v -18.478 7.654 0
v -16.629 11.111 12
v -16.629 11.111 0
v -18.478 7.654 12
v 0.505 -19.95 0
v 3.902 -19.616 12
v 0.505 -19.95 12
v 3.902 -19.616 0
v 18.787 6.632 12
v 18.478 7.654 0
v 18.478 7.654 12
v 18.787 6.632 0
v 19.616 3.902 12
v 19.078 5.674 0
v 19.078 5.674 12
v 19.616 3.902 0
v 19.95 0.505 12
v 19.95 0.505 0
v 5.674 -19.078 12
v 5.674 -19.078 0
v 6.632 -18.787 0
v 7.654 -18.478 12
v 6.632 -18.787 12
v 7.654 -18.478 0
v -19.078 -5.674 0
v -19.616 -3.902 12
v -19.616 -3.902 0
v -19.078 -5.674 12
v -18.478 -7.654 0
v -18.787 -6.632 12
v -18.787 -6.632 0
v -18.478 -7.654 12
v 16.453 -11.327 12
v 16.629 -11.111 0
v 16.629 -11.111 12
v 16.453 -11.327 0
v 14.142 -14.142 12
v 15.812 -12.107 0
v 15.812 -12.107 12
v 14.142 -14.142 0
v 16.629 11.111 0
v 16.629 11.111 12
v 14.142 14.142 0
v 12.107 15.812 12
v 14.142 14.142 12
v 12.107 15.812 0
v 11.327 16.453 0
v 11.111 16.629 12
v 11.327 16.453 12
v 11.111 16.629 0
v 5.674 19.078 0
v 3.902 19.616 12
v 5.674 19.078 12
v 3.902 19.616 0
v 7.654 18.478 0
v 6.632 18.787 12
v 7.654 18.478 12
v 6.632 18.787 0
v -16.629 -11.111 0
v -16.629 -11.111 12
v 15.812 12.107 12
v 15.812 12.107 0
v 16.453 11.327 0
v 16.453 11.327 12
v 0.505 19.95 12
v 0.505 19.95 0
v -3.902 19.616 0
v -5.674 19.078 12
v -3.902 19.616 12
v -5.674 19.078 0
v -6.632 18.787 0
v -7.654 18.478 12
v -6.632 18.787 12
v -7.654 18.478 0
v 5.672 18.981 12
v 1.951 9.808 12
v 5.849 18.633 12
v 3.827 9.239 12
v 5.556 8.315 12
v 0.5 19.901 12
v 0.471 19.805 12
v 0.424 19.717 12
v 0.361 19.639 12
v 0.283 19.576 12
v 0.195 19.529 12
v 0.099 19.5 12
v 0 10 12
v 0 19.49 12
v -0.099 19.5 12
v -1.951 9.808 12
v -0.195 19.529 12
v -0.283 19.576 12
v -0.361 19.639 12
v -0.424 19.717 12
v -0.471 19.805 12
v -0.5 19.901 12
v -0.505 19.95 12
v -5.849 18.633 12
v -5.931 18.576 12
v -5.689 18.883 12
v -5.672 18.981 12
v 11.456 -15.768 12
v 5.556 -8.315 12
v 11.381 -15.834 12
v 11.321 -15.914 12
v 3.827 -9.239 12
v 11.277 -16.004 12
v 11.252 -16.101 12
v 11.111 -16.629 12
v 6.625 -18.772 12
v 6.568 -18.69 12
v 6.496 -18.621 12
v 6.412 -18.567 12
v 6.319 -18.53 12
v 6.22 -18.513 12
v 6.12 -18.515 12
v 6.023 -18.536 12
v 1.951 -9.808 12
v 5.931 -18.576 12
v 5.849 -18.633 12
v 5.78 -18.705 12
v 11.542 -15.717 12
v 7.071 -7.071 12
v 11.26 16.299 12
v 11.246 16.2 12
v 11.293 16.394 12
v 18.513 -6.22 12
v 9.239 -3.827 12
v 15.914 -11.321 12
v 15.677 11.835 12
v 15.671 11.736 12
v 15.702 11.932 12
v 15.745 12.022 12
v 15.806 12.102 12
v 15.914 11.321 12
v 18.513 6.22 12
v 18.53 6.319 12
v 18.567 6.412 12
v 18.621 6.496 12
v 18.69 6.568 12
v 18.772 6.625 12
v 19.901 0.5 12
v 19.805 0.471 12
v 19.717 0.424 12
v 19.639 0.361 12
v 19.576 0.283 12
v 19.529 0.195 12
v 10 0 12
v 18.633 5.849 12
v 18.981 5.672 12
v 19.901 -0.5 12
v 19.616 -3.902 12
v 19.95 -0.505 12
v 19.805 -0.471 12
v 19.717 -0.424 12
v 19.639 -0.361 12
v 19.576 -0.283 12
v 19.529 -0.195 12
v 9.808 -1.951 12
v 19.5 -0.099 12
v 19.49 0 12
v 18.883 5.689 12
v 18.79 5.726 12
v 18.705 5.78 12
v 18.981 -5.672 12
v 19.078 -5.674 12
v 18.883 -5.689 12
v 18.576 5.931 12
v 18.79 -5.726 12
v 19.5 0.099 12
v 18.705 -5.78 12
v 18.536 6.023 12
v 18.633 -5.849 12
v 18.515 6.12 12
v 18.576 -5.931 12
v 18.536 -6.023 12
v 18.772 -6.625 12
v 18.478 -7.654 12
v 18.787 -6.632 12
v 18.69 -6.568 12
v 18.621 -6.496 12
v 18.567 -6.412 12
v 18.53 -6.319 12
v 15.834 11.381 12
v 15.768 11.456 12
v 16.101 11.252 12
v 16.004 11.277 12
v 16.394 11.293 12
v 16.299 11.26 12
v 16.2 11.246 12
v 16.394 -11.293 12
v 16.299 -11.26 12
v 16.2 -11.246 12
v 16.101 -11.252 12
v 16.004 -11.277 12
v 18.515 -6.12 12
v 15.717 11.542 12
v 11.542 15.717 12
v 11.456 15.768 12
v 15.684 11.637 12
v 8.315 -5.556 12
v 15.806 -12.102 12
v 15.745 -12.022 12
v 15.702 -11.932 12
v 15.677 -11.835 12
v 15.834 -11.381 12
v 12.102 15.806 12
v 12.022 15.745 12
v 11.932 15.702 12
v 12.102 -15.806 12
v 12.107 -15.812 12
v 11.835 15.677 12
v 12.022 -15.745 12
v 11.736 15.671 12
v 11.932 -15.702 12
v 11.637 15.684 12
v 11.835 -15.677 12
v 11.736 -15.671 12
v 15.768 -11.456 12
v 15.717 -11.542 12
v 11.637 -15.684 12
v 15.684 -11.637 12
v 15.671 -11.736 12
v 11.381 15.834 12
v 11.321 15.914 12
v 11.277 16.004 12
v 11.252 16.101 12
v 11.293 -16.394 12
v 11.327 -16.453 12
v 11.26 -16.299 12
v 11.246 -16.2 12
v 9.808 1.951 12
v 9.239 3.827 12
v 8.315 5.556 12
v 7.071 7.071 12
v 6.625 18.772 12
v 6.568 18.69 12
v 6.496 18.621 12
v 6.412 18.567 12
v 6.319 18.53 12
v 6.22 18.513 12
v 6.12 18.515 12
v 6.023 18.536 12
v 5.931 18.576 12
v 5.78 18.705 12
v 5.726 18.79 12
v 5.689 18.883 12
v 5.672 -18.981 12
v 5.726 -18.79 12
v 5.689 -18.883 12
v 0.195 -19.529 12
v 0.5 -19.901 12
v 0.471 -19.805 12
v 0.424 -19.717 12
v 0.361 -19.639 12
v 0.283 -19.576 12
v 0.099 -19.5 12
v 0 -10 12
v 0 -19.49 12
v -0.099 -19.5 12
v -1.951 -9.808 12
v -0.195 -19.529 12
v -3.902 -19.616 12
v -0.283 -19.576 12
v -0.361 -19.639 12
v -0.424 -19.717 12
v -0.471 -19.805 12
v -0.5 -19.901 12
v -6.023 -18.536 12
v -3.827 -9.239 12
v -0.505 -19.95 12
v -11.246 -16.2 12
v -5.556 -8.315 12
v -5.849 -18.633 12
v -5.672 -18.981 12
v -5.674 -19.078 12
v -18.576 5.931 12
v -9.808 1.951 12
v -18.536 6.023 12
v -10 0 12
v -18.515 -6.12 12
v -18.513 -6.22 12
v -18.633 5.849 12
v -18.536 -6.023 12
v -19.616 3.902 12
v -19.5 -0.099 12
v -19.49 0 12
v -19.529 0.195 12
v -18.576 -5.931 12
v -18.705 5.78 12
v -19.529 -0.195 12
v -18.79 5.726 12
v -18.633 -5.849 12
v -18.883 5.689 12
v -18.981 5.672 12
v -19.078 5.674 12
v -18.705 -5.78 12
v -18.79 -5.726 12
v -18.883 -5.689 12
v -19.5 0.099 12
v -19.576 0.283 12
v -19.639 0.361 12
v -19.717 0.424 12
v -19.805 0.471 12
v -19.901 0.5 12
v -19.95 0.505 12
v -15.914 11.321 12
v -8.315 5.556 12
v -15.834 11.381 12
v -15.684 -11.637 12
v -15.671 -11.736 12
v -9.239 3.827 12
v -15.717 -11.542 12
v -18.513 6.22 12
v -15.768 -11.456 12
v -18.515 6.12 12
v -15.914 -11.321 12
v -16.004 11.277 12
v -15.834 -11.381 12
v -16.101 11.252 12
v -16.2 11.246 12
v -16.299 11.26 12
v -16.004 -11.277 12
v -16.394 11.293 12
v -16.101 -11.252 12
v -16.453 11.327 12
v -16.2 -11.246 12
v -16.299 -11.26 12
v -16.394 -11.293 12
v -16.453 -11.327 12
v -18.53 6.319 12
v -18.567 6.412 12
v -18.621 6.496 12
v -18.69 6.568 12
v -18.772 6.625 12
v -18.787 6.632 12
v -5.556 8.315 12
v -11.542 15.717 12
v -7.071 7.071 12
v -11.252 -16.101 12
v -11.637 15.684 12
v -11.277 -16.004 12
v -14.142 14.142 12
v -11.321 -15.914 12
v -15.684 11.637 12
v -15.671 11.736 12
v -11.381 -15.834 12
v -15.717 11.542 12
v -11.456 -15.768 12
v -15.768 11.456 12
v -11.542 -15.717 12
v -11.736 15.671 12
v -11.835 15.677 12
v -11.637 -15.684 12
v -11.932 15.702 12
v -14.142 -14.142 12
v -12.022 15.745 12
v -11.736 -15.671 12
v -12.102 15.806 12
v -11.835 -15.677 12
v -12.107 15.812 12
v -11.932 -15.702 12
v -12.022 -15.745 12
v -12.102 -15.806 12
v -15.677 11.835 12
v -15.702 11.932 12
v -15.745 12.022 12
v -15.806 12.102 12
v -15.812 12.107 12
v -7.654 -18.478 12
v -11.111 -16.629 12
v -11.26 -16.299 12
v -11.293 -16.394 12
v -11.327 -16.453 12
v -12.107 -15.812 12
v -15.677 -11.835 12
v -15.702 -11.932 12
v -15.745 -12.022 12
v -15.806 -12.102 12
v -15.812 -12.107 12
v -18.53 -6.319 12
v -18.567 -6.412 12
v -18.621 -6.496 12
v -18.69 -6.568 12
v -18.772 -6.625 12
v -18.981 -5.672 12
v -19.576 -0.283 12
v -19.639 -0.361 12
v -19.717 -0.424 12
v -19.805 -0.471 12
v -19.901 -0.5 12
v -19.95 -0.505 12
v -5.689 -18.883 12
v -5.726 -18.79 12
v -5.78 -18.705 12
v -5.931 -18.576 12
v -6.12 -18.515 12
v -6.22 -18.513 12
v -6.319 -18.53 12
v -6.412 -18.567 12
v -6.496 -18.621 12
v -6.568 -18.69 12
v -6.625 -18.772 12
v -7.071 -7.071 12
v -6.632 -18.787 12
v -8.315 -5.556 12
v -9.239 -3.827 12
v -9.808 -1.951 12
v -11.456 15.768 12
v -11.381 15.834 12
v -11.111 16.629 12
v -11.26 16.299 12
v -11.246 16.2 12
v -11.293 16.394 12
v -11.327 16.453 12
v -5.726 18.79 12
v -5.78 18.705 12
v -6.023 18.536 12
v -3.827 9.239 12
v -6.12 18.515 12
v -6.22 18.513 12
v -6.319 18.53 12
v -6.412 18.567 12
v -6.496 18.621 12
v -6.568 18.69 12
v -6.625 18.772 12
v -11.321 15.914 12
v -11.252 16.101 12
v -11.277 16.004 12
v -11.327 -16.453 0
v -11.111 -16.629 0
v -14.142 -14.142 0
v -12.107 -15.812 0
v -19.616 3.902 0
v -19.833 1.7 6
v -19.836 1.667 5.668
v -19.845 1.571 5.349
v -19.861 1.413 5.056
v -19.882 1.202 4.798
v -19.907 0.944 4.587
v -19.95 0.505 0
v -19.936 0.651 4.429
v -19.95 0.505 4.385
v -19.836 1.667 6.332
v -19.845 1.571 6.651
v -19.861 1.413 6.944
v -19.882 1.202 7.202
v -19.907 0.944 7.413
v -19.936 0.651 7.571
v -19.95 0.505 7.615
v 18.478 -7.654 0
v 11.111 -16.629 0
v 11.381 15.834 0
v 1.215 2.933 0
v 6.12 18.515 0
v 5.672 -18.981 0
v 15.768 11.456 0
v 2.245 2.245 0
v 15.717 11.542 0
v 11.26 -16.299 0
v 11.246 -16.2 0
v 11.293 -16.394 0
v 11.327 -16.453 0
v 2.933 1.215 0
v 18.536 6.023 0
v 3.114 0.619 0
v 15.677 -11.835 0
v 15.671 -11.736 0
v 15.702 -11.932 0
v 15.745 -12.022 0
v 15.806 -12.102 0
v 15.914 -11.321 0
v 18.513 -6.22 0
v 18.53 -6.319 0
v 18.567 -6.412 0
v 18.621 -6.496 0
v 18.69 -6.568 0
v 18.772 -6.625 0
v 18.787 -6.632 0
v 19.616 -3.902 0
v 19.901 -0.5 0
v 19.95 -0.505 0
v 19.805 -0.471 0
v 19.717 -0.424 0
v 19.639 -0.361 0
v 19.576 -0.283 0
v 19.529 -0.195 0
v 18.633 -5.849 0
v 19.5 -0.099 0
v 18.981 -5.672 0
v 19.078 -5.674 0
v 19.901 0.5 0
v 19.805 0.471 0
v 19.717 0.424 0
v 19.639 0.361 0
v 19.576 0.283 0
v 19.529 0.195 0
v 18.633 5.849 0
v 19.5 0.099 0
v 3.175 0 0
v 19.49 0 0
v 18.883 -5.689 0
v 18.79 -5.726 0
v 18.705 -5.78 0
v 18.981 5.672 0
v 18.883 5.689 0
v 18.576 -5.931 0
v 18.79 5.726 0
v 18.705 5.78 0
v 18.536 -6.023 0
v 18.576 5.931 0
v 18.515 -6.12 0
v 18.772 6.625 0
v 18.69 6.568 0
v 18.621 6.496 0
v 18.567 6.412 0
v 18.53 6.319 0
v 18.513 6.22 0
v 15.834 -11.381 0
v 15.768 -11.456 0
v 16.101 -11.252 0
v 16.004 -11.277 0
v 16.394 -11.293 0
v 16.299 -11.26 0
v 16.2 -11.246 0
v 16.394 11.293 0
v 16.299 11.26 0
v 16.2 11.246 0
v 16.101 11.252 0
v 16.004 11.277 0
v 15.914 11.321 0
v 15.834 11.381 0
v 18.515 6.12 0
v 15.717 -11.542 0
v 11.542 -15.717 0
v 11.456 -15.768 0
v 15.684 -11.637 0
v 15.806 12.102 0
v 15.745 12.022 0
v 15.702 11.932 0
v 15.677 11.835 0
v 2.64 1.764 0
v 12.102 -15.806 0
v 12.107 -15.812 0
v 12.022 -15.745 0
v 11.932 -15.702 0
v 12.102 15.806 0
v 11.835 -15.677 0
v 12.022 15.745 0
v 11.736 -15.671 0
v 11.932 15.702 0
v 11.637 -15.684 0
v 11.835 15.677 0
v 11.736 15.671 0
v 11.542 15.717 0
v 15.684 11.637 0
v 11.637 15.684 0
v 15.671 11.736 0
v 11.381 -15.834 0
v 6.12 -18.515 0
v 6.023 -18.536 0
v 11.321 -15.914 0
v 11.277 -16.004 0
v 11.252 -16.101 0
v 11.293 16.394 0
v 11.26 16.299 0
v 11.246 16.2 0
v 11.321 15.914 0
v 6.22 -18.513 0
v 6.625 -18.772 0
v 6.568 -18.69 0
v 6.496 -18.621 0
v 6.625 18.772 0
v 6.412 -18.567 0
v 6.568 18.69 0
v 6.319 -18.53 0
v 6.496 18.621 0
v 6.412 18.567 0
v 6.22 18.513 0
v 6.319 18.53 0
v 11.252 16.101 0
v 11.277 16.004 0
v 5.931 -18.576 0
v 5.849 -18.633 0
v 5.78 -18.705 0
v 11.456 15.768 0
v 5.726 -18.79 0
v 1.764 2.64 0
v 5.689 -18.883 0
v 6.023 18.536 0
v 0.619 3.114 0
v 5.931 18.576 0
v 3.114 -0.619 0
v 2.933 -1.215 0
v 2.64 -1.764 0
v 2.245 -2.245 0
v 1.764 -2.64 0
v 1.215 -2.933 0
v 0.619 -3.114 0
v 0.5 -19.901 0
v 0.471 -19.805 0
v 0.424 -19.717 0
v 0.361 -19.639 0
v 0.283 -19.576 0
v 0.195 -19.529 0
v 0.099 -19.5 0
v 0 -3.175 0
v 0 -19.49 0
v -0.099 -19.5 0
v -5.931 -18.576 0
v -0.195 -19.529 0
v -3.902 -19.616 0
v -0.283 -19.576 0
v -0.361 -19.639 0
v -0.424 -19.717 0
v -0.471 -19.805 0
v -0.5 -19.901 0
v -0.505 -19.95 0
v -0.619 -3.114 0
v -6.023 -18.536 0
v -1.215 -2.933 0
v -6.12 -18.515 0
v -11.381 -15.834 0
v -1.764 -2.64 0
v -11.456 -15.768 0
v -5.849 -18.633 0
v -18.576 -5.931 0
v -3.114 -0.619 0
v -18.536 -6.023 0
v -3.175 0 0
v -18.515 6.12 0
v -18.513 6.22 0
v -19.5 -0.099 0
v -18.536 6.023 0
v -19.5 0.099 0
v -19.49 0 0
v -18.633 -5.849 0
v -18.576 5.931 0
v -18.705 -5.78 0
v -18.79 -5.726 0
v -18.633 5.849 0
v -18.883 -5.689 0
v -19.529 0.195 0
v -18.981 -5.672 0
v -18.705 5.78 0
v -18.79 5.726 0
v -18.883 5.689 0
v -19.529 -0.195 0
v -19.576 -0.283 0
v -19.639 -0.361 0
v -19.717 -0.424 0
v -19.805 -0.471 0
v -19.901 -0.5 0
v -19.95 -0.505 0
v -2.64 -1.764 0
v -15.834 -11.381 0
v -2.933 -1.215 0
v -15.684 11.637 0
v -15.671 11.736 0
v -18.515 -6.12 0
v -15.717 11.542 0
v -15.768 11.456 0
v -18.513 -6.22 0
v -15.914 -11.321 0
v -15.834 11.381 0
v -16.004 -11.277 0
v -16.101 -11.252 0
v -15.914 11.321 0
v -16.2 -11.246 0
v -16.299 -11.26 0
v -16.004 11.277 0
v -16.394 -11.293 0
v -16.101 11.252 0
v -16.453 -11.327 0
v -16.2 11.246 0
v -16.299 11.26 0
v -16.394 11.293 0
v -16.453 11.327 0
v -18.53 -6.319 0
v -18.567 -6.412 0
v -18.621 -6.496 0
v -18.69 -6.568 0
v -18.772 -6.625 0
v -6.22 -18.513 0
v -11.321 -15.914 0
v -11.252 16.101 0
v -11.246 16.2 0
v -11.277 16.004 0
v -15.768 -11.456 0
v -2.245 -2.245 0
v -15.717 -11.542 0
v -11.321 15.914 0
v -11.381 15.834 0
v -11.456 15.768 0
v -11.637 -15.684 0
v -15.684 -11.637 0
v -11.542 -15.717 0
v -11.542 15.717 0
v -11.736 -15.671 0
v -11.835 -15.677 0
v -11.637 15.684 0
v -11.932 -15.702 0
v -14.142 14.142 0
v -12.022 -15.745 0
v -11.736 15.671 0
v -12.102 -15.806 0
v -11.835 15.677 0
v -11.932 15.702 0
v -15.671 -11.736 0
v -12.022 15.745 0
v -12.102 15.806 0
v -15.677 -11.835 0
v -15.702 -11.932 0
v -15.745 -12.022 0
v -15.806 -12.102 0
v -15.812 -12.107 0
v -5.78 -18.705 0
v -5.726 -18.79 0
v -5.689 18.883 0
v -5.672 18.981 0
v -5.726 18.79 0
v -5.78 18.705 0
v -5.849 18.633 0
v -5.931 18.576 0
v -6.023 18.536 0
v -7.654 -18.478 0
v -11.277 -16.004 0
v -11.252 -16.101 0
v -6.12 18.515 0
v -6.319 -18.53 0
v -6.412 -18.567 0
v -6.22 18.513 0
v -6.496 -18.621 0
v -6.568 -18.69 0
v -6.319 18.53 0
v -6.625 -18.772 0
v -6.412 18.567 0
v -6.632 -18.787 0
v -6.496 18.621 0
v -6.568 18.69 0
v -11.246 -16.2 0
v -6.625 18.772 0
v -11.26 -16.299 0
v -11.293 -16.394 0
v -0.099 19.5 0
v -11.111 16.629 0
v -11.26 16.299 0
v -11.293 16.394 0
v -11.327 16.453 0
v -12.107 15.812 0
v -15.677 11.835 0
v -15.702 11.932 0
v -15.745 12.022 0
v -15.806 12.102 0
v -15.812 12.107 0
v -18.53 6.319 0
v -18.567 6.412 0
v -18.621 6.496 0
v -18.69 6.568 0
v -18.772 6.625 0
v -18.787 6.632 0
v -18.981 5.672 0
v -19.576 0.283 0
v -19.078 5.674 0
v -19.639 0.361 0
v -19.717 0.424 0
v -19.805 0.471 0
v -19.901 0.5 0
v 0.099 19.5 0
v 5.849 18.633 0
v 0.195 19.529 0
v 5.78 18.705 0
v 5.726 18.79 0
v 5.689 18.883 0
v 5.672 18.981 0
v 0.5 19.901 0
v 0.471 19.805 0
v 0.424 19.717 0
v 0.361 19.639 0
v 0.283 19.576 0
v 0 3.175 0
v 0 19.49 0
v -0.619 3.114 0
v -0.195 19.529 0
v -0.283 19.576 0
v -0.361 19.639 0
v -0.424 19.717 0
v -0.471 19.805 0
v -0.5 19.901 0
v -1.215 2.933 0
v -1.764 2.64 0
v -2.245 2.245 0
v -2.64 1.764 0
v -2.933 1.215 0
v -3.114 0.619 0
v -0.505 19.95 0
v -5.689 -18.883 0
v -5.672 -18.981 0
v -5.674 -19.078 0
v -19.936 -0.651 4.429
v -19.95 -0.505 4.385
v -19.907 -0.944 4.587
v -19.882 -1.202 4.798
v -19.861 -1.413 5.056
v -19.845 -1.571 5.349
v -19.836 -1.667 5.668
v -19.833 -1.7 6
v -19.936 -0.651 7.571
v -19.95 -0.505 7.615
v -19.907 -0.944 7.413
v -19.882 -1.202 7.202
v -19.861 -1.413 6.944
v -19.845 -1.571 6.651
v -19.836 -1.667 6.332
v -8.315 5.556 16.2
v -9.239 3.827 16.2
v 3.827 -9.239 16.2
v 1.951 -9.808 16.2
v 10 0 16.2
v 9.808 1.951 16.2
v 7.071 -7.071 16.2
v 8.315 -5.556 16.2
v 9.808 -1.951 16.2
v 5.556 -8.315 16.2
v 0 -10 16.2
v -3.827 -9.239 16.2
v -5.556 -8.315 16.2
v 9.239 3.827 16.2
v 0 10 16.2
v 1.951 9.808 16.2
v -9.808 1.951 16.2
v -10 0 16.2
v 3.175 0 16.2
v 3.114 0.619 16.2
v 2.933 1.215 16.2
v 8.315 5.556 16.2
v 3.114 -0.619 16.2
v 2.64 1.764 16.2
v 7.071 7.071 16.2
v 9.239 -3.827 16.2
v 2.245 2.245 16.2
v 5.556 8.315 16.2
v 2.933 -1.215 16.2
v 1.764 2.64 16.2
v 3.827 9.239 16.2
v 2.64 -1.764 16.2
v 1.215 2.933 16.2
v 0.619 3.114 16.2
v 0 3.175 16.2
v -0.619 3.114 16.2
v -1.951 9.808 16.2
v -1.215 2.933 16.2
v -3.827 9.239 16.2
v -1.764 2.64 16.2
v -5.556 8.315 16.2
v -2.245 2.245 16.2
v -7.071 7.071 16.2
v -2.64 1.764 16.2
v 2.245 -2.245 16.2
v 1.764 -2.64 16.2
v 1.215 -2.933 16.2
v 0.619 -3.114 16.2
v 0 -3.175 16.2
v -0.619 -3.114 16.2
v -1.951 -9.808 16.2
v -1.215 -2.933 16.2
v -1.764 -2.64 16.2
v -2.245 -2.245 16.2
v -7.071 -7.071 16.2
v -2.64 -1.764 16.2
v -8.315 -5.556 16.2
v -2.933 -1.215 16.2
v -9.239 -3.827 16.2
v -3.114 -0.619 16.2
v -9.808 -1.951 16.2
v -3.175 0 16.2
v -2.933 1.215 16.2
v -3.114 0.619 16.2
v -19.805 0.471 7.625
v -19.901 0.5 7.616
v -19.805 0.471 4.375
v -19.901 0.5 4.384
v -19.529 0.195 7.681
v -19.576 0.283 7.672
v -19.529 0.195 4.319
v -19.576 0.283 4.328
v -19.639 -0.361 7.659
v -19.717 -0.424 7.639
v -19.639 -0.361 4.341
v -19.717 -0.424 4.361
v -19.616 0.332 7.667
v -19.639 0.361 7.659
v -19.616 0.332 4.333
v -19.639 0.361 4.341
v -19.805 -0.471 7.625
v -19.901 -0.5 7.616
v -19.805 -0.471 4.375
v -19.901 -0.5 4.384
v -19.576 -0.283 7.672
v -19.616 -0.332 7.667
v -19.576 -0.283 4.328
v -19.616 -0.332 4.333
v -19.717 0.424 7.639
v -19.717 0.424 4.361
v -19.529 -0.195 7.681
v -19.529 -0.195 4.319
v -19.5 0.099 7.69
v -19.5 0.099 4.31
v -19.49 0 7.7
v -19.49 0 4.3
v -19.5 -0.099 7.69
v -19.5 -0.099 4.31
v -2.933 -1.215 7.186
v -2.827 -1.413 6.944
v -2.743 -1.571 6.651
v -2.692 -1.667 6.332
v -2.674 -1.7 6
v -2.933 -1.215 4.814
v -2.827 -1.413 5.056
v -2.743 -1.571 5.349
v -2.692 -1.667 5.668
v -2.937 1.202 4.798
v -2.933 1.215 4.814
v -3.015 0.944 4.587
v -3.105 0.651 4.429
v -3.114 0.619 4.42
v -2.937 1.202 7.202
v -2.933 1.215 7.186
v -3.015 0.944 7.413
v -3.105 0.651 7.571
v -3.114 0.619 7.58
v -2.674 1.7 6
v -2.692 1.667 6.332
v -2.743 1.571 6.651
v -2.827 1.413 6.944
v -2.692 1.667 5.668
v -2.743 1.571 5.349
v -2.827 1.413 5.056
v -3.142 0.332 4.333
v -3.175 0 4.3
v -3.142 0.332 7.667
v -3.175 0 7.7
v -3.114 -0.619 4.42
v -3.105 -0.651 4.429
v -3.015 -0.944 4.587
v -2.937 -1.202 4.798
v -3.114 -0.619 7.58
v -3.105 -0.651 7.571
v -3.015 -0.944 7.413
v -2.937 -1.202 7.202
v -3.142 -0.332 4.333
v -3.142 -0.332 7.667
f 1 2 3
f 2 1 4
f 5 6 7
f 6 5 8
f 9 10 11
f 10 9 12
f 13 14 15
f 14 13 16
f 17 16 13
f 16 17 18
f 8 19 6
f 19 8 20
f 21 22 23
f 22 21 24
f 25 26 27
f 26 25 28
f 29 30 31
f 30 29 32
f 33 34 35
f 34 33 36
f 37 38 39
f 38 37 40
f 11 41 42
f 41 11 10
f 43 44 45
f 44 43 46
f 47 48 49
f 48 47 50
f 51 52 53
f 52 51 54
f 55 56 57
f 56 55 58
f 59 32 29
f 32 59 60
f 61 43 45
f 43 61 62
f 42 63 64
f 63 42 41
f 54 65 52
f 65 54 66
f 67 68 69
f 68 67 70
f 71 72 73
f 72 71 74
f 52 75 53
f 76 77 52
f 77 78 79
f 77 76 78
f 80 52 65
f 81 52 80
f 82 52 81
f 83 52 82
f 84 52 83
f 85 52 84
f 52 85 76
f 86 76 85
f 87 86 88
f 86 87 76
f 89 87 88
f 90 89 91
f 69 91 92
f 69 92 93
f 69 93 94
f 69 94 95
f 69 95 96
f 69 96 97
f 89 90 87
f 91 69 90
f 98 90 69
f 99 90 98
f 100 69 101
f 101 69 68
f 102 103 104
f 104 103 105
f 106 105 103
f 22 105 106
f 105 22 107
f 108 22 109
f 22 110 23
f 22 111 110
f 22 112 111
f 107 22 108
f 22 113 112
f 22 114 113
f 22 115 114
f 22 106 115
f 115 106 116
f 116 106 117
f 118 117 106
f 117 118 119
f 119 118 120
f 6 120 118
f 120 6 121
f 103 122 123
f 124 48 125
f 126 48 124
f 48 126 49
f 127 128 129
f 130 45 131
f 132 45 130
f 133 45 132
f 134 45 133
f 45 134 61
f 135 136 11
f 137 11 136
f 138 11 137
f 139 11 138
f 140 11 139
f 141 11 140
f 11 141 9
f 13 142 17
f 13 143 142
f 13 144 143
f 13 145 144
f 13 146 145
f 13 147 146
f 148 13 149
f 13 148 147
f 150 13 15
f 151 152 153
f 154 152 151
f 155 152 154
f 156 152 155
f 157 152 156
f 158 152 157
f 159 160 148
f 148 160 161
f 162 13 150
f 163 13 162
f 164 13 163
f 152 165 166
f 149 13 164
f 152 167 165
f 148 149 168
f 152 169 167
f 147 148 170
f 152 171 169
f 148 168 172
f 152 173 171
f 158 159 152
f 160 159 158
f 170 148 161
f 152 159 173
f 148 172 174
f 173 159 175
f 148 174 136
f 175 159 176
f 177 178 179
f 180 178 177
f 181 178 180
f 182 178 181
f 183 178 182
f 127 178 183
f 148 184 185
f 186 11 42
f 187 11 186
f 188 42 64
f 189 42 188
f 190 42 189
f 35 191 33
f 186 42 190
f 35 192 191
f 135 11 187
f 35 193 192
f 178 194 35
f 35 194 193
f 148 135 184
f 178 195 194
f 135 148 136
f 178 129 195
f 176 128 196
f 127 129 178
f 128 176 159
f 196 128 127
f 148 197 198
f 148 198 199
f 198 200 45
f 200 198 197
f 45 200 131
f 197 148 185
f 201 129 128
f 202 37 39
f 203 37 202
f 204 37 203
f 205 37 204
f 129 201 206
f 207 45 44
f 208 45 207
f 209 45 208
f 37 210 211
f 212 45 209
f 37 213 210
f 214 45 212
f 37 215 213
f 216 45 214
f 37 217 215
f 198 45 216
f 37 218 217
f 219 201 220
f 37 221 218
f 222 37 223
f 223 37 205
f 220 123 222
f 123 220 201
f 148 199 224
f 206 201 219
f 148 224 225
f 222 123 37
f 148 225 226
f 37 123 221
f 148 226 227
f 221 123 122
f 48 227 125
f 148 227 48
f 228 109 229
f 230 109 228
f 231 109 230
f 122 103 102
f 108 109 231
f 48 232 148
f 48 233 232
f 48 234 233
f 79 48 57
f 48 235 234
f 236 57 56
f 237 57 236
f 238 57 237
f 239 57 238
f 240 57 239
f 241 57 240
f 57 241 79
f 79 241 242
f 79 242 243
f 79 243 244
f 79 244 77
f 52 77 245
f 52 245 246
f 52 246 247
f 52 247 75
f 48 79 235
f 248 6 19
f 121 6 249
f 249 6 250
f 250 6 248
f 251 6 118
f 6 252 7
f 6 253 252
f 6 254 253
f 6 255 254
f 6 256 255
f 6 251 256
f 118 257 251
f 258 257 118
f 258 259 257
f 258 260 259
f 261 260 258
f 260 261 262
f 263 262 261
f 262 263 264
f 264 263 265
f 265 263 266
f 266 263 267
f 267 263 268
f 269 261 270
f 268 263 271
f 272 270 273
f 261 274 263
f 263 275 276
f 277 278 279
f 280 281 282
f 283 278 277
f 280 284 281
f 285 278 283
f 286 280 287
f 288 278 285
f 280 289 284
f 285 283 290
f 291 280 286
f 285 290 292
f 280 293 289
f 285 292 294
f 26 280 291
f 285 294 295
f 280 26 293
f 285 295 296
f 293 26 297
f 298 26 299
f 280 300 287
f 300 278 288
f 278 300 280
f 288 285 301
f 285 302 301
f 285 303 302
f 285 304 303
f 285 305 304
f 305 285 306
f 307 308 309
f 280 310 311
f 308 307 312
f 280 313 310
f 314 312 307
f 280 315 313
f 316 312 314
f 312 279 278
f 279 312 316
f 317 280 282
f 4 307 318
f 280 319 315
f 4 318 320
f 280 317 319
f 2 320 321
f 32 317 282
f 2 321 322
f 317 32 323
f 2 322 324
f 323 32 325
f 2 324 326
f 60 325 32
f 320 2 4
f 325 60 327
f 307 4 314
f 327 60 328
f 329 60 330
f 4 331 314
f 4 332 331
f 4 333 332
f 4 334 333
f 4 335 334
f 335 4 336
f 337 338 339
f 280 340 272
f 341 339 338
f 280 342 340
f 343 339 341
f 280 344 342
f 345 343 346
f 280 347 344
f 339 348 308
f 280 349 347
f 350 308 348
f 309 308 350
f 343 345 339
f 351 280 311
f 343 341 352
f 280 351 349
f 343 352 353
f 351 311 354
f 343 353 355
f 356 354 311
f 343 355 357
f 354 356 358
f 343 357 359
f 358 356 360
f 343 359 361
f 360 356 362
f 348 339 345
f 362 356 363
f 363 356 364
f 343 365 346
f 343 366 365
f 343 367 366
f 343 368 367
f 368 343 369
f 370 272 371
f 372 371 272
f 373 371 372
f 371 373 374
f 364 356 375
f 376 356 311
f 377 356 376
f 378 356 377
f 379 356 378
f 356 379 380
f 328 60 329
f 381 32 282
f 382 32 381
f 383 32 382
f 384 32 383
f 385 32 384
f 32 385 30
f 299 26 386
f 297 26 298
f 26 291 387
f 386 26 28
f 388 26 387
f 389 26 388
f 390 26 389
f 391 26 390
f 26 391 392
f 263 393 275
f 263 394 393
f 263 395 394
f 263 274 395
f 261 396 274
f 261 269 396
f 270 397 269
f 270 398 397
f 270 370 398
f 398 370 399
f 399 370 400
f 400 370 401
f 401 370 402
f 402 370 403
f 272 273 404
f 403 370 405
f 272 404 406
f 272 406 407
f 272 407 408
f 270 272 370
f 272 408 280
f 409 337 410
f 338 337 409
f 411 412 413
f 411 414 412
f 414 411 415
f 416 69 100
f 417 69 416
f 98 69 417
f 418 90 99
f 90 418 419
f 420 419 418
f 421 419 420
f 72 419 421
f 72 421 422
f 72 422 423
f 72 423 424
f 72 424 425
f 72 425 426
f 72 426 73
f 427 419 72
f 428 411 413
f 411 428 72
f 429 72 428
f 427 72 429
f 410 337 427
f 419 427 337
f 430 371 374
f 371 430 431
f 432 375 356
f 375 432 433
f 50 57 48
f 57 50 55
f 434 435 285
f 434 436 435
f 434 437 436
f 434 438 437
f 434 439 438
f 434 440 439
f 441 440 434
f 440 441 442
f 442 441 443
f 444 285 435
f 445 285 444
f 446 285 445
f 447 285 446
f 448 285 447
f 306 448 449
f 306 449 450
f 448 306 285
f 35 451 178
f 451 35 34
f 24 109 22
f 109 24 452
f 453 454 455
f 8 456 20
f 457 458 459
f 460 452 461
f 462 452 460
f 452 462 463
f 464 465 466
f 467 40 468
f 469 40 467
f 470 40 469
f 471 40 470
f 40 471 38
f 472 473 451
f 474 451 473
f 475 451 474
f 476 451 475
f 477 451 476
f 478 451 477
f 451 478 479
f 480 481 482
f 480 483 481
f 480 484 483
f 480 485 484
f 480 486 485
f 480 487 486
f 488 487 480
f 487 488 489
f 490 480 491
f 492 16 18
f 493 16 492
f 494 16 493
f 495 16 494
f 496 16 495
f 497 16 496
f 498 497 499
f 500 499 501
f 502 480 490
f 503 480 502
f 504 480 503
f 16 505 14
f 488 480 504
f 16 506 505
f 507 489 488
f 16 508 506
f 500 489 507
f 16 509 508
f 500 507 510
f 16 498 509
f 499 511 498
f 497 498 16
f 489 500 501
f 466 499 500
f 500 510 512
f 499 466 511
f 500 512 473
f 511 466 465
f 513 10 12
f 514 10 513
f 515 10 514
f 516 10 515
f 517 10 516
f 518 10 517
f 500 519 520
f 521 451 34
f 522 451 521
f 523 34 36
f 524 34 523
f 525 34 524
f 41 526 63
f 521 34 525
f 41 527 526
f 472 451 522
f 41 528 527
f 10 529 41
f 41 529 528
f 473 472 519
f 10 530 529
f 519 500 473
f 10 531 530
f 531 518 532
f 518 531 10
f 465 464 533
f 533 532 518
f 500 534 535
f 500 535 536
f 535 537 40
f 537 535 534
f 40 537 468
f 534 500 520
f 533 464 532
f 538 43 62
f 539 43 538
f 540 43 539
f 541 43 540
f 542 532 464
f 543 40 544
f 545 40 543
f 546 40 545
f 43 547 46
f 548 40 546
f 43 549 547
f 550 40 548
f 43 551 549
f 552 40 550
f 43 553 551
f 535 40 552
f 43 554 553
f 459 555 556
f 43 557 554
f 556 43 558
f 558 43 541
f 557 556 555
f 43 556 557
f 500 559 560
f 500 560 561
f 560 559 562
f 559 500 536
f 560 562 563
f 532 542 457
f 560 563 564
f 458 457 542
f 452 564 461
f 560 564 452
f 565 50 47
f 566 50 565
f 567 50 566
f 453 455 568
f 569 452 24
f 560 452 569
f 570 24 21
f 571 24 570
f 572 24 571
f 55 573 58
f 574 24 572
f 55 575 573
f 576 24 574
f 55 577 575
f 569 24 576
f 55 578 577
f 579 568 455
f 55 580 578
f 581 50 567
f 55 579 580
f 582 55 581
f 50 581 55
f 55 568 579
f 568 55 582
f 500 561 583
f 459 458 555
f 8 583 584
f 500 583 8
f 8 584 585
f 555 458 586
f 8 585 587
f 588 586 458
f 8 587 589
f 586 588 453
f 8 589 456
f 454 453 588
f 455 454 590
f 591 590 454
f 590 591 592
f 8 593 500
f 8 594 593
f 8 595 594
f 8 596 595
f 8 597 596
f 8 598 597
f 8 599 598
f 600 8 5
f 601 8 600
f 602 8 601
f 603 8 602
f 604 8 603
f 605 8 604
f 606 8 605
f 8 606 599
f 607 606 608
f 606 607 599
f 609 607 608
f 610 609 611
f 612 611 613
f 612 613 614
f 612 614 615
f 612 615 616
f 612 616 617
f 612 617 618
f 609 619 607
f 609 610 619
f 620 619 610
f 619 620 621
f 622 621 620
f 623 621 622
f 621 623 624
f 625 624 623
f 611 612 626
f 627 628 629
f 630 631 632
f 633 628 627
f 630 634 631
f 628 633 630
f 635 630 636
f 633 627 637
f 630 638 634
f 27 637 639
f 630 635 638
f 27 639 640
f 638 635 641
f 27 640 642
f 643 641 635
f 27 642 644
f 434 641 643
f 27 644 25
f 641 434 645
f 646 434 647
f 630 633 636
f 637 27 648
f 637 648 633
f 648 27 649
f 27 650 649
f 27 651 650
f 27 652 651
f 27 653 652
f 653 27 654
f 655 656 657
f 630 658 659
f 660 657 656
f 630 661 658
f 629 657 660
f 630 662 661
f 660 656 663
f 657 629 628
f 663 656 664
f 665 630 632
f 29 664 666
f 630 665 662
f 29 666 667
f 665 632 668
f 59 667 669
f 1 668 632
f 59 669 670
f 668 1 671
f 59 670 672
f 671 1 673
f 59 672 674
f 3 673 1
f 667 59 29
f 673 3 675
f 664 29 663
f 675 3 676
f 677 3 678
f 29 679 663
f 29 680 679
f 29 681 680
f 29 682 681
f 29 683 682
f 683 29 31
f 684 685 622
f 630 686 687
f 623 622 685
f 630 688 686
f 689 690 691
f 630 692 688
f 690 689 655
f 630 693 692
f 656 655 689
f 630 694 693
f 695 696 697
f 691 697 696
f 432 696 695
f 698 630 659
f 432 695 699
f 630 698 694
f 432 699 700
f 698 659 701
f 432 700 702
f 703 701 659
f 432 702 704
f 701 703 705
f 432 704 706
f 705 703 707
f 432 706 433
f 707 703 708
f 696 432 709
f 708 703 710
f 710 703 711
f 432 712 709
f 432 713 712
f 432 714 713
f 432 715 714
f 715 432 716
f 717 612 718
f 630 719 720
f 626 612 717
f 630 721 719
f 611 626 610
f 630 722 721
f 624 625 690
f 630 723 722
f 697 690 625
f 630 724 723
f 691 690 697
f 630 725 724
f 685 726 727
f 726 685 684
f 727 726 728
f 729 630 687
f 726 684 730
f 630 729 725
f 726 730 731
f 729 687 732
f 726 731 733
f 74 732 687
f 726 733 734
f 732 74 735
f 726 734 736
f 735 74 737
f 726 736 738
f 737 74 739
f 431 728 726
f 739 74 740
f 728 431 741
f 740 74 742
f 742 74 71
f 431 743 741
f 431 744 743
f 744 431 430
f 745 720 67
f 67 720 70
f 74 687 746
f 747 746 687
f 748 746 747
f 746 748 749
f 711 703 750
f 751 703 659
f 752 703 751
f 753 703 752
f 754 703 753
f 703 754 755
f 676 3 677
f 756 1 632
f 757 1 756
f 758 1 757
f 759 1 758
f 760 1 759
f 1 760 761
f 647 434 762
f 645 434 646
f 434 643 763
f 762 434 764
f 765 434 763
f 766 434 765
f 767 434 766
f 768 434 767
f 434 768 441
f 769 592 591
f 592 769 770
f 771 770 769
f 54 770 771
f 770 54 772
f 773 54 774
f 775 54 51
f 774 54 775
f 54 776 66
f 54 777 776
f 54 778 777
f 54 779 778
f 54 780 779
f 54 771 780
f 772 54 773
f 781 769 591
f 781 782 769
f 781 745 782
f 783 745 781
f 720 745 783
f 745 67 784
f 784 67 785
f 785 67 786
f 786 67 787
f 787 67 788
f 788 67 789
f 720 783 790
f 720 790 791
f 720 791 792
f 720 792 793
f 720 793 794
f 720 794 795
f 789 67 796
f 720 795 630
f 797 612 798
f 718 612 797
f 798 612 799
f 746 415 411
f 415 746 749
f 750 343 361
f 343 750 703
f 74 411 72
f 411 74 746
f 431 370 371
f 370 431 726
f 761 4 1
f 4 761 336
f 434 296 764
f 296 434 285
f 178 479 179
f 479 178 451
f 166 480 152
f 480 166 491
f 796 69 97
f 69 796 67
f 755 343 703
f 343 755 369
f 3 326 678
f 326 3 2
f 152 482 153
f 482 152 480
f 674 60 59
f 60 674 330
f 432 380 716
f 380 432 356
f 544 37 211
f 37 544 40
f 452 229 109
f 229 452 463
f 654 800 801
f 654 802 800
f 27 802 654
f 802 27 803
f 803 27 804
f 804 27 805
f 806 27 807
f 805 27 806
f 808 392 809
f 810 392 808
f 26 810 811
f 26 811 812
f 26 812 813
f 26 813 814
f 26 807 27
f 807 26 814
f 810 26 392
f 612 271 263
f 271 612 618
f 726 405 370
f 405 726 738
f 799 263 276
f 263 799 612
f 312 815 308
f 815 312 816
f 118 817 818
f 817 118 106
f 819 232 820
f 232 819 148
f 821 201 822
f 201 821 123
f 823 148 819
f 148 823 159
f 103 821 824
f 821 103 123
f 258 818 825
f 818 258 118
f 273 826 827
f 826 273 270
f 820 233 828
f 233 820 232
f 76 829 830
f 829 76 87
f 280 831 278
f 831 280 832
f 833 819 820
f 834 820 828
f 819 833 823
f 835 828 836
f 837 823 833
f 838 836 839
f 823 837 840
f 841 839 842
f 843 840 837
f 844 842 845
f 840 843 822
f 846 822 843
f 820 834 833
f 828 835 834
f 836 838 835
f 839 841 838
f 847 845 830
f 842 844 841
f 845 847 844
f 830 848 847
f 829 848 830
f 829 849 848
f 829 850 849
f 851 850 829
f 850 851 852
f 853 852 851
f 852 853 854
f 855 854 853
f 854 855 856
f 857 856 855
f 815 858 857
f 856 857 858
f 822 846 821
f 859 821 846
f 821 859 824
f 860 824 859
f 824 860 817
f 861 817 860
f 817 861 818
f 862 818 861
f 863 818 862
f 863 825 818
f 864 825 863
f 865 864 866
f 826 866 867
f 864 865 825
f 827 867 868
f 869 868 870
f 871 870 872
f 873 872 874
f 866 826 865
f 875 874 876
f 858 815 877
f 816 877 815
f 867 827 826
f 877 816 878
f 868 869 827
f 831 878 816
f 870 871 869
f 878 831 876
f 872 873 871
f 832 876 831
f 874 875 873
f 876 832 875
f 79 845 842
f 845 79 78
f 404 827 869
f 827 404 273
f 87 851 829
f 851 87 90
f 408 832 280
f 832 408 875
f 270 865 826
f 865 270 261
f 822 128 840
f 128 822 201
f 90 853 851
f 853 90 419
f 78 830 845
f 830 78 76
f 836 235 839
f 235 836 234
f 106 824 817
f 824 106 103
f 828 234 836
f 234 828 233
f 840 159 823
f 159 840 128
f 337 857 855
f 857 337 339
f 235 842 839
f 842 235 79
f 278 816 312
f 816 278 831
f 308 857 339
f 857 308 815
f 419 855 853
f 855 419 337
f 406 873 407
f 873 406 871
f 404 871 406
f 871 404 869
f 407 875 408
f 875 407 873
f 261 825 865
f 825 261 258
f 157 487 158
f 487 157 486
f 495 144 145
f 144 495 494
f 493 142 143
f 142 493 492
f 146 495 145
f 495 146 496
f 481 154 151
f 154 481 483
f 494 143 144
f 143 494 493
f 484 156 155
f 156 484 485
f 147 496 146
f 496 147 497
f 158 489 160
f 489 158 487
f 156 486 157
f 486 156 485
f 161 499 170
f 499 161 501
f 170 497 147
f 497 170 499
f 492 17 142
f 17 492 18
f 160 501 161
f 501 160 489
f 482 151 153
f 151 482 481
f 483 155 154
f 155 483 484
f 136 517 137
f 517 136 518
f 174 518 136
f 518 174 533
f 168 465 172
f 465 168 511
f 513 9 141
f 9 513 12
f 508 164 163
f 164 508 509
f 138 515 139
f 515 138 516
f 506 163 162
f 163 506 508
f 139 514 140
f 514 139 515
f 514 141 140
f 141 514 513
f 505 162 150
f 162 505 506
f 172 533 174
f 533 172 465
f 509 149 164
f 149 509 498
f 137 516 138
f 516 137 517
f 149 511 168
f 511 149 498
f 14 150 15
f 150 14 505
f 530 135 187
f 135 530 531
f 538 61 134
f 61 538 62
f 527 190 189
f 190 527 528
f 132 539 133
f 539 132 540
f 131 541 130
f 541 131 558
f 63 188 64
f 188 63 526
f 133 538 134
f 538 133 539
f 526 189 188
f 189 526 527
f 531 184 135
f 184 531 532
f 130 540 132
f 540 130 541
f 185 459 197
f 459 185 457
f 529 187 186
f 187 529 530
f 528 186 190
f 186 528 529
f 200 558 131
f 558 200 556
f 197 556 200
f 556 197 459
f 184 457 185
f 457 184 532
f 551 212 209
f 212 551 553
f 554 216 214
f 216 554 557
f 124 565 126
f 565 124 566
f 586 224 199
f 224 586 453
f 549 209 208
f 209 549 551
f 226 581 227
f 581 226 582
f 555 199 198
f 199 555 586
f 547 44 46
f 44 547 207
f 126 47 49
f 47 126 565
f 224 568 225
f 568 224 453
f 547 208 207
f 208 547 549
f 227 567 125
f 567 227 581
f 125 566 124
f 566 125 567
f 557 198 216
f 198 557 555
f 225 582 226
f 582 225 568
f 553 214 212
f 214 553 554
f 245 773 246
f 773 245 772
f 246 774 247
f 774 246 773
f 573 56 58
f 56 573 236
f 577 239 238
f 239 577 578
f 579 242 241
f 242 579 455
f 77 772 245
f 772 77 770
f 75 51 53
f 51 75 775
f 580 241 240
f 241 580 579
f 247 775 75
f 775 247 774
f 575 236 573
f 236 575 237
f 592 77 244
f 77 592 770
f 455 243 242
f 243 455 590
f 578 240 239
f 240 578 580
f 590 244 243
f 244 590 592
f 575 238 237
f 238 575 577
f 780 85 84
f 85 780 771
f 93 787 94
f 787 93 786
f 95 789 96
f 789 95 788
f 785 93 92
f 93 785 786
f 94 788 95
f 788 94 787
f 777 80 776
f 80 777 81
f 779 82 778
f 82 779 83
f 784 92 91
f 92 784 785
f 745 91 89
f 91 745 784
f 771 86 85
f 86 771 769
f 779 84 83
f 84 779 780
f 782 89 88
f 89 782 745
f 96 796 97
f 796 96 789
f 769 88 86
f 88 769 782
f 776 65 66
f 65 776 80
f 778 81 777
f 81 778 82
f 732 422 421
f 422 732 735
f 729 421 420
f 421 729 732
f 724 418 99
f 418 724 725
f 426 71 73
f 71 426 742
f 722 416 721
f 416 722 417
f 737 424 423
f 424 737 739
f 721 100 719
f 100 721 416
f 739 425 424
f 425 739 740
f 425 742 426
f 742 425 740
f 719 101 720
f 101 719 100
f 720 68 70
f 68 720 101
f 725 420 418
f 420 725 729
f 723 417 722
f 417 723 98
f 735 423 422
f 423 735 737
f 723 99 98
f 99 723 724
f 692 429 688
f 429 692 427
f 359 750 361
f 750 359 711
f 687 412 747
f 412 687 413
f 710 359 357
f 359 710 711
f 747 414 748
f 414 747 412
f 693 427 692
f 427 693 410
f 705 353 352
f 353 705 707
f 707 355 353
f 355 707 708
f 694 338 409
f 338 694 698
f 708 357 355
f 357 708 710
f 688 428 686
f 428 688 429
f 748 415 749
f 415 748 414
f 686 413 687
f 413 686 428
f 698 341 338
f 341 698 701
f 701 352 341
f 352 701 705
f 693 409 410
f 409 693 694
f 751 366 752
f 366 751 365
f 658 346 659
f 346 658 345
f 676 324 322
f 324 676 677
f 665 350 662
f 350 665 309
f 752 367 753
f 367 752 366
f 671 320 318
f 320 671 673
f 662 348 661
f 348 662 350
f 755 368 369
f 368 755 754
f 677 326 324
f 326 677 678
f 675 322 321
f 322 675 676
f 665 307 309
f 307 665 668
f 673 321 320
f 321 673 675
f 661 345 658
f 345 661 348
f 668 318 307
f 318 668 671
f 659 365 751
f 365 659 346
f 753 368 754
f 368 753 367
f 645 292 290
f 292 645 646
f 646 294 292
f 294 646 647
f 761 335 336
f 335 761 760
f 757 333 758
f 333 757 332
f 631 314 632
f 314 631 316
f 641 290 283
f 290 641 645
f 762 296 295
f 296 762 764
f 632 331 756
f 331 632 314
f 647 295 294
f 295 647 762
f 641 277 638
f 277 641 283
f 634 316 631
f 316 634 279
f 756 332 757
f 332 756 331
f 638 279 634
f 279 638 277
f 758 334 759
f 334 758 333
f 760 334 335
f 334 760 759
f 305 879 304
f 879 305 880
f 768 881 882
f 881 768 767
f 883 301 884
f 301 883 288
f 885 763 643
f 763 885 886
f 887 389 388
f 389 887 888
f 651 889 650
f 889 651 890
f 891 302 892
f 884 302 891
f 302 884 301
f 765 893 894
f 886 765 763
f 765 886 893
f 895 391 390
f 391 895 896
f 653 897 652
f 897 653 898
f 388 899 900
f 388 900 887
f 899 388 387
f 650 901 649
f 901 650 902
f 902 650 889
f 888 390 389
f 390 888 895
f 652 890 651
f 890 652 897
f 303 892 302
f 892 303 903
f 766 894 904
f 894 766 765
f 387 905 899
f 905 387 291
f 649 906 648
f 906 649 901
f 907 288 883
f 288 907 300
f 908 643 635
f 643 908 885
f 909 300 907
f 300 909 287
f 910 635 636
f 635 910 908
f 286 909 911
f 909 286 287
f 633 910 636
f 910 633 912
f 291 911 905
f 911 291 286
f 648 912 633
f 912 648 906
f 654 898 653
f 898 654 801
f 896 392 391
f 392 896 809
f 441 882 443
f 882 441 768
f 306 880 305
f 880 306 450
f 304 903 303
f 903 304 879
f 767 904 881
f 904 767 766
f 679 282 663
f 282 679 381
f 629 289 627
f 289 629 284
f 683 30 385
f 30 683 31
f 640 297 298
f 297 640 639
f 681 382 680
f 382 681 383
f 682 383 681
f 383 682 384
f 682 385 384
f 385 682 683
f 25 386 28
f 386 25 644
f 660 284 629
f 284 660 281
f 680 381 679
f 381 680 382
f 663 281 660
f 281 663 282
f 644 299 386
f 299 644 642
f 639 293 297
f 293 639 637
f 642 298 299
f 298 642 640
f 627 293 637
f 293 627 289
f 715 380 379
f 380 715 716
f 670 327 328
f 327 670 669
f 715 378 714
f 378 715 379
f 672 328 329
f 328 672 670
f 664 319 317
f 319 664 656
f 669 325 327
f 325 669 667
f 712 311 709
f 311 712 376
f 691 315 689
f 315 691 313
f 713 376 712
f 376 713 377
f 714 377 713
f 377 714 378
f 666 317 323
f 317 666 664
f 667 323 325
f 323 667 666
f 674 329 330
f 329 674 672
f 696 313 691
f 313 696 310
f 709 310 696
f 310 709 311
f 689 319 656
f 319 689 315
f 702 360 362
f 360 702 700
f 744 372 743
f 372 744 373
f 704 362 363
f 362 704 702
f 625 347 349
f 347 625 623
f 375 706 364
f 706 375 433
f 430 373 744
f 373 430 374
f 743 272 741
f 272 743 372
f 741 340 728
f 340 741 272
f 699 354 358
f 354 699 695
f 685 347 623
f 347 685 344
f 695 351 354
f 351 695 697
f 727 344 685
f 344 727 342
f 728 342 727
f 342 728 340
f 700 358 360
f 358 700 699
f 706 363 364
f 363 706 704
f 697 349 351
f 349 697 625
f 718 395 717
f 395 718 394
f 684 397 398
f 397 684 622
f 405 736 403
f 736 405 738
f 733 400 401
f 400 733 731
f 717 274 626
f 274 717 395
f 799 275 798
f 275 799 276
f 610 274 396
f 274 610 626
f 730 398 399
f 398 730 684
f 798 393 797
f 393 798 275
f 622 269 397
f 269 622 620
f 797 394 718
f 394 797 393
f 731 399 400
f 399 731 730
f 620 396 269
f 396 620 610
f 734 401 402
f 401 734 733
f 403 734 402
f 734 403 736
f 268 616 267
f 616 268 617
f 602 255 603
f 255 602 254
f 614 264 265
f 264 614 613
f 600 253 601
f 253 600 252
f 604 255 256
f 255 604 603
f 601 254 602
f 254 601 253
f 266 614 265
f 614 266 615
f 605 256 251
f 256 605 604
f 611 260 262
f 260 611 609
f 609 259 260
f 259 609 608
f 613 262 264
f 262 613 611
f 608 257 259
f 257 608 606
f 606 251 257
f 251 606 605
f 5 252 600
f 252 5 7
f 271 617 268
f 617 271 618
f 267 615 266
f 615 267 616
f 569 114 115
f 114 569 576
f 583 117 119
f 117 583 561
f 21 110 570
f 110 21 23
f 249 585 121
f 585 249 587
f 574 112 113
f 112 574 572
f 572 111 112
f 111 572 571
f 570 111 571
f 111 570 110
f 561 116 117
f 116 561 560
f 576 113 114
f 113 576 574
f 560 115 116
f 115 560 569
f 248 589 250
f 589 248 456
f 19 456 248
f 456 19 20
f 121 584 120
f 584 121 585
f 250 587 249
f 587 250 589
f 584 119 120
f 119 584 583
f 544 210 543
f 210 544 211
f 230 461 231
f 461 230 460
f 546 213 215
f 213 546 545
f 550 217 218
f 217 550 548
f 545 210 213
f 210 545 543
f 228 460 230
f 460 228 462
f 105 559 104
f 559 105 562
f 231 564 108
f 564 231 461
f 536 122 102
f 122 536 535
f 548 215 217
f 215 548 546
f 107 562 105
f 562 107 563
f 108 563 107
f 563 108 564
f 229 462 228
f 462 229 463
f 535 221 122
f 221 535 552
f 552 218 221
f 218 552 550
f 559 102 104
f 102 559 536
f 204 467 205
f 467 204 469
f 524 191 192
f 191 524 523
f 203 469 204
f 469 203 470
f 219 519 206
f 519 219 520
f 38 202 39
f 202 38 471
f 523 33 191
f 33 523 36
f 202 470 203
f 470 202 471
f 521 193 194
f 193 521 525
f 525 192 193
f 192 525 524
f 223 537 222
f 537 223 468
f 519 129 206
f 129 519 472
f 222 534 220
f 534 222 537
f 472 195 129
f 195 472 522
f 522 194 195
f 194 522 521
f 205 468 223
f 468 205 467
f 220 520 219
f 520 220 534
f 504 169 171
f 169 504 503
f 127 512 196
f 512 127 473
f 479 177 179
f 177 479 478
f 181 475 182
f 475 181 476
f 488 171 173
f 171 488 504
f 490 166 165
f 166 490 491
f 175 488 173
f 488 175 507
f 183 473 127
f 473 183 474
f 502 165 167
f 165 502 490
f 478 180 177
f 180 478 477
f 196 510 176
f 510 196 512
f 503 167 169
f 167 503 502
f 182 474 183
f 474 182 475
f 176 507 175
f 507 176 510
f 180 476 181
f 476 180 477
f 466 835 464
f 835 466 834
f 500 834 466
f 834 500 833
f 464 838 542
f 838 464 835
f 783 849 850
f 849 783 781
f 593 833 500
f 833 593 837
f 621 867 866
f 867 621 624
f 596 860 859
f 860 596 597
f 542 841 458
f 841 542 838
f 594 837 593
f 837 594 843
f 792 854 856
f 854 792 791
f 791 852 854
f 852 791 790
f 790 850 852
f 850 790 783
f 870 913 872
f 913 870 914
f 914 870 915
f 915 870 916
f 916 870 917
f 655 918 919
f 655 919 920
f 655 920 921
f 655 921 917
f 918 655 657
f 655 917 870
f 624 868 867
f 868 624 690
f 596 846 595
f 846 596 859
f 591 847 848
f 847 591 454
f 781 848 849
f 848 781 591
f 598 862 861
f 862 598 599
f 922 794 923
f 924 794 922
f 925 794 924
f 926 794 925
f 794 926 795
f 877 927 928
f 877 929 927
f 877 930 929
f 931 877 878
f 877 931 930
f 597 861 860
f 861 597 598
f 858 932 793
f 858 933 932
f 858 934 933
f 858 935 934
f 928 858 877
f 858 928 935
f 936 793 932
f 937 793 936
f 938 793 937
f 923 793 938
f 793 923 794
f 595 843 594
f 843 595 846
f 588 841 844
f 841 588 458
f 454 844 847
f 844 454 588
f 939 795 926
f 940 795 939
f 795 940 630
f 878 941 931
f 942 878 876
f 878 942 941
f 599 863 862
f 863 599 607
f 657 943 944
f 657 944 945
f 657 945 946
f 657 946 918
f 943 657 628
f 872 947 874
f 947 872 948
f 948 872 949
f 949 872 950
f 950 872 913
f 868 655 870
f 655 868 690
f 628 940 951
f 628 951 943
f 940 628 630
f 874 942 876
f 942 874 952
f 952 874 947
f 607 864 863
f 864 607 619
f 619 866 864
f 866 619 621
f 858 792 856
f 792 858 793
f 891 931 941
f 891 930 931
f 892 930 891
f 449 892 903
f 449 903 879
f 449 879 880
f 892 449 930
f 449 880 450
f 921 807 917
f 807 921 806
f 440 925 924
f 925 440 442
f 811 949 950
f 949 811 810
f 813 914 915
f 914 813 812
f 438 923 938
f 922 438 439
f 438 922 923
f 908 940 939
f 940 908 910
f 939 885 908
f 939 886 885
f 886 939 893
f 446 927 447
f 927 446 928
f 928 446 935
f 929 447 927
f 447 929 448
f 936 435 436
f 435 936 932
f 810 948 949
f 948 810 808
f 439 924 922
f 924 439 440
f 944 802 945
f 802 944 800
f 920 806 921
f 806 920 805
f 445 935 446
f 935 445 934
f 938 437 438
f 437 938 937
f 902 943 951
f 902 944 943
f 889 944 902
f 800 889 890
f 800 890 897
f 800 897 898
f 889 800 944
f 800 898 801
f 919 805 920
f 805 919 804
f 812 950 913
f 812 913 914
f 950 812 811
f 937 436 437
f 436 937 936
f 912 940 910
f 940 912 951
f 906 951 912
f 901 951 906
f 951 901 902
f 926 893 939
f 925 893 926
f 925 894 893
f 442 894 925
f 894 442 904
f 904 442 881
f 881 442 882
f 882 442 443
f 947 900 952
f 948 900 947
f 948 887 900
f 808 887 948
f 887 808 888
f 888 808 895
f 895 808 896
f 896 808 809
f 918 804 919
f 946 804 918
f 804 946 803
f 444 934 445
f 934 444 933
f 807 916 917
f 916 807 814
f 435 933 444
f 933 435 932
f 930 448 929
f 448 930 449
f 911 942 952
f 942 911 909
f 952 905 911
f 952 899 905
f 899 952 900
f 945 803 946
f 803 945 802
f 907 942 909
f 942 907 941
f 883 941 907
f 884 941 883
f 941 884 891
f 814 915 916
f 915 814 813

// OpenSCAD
$fn = 32;

// ----------------------------------------------------------------------
// Hand knob: 40 x 40 x 16.2 mm
// ----------------------------------------------------------------------

// --- parameters (mm) ---
knob_d = 40;              // knob diameter
knob_h = 12;              // knob height
bore_d = 6.35;            // shaft bore
set_d = 3.4;              // set screw tap hole
knurl_d = 1.02;           // knurl groove diameter
knurl_n = 20;             // number of knurl grooves
cap_h = 4.2;              // raised centre cap
cap_d = 20;               // centre cap diameter

module body() {
  cylinder(h = knob_h, d = knob_d);
}

module cap() {
  translate([0, 0, knob_h - 1]) cylinder(h = cap_h + 1, d = cap_d);
}

difference() {
  union() {
    body();
    cap();
  }
  translate([0, 0, -1]) cylinder(h = knob_h + cap_h + 2, d = bore_d);
  /* knurl grooves */
  for (i = [0 : knurl_n - 1])
    rotate([0, 0, i * 360 / knurl_n])
      translate([knob_d / 2, 0, -0.5])
        cylinder(h = knob_h + 1, d = knurl_d);
  translate([-knob_d / 2 - 1, 0, knob_h * 0.5]) rotate([0, 90, 0]) cylinder(h = knob_d / 2 + 2, d = set_d);
}
